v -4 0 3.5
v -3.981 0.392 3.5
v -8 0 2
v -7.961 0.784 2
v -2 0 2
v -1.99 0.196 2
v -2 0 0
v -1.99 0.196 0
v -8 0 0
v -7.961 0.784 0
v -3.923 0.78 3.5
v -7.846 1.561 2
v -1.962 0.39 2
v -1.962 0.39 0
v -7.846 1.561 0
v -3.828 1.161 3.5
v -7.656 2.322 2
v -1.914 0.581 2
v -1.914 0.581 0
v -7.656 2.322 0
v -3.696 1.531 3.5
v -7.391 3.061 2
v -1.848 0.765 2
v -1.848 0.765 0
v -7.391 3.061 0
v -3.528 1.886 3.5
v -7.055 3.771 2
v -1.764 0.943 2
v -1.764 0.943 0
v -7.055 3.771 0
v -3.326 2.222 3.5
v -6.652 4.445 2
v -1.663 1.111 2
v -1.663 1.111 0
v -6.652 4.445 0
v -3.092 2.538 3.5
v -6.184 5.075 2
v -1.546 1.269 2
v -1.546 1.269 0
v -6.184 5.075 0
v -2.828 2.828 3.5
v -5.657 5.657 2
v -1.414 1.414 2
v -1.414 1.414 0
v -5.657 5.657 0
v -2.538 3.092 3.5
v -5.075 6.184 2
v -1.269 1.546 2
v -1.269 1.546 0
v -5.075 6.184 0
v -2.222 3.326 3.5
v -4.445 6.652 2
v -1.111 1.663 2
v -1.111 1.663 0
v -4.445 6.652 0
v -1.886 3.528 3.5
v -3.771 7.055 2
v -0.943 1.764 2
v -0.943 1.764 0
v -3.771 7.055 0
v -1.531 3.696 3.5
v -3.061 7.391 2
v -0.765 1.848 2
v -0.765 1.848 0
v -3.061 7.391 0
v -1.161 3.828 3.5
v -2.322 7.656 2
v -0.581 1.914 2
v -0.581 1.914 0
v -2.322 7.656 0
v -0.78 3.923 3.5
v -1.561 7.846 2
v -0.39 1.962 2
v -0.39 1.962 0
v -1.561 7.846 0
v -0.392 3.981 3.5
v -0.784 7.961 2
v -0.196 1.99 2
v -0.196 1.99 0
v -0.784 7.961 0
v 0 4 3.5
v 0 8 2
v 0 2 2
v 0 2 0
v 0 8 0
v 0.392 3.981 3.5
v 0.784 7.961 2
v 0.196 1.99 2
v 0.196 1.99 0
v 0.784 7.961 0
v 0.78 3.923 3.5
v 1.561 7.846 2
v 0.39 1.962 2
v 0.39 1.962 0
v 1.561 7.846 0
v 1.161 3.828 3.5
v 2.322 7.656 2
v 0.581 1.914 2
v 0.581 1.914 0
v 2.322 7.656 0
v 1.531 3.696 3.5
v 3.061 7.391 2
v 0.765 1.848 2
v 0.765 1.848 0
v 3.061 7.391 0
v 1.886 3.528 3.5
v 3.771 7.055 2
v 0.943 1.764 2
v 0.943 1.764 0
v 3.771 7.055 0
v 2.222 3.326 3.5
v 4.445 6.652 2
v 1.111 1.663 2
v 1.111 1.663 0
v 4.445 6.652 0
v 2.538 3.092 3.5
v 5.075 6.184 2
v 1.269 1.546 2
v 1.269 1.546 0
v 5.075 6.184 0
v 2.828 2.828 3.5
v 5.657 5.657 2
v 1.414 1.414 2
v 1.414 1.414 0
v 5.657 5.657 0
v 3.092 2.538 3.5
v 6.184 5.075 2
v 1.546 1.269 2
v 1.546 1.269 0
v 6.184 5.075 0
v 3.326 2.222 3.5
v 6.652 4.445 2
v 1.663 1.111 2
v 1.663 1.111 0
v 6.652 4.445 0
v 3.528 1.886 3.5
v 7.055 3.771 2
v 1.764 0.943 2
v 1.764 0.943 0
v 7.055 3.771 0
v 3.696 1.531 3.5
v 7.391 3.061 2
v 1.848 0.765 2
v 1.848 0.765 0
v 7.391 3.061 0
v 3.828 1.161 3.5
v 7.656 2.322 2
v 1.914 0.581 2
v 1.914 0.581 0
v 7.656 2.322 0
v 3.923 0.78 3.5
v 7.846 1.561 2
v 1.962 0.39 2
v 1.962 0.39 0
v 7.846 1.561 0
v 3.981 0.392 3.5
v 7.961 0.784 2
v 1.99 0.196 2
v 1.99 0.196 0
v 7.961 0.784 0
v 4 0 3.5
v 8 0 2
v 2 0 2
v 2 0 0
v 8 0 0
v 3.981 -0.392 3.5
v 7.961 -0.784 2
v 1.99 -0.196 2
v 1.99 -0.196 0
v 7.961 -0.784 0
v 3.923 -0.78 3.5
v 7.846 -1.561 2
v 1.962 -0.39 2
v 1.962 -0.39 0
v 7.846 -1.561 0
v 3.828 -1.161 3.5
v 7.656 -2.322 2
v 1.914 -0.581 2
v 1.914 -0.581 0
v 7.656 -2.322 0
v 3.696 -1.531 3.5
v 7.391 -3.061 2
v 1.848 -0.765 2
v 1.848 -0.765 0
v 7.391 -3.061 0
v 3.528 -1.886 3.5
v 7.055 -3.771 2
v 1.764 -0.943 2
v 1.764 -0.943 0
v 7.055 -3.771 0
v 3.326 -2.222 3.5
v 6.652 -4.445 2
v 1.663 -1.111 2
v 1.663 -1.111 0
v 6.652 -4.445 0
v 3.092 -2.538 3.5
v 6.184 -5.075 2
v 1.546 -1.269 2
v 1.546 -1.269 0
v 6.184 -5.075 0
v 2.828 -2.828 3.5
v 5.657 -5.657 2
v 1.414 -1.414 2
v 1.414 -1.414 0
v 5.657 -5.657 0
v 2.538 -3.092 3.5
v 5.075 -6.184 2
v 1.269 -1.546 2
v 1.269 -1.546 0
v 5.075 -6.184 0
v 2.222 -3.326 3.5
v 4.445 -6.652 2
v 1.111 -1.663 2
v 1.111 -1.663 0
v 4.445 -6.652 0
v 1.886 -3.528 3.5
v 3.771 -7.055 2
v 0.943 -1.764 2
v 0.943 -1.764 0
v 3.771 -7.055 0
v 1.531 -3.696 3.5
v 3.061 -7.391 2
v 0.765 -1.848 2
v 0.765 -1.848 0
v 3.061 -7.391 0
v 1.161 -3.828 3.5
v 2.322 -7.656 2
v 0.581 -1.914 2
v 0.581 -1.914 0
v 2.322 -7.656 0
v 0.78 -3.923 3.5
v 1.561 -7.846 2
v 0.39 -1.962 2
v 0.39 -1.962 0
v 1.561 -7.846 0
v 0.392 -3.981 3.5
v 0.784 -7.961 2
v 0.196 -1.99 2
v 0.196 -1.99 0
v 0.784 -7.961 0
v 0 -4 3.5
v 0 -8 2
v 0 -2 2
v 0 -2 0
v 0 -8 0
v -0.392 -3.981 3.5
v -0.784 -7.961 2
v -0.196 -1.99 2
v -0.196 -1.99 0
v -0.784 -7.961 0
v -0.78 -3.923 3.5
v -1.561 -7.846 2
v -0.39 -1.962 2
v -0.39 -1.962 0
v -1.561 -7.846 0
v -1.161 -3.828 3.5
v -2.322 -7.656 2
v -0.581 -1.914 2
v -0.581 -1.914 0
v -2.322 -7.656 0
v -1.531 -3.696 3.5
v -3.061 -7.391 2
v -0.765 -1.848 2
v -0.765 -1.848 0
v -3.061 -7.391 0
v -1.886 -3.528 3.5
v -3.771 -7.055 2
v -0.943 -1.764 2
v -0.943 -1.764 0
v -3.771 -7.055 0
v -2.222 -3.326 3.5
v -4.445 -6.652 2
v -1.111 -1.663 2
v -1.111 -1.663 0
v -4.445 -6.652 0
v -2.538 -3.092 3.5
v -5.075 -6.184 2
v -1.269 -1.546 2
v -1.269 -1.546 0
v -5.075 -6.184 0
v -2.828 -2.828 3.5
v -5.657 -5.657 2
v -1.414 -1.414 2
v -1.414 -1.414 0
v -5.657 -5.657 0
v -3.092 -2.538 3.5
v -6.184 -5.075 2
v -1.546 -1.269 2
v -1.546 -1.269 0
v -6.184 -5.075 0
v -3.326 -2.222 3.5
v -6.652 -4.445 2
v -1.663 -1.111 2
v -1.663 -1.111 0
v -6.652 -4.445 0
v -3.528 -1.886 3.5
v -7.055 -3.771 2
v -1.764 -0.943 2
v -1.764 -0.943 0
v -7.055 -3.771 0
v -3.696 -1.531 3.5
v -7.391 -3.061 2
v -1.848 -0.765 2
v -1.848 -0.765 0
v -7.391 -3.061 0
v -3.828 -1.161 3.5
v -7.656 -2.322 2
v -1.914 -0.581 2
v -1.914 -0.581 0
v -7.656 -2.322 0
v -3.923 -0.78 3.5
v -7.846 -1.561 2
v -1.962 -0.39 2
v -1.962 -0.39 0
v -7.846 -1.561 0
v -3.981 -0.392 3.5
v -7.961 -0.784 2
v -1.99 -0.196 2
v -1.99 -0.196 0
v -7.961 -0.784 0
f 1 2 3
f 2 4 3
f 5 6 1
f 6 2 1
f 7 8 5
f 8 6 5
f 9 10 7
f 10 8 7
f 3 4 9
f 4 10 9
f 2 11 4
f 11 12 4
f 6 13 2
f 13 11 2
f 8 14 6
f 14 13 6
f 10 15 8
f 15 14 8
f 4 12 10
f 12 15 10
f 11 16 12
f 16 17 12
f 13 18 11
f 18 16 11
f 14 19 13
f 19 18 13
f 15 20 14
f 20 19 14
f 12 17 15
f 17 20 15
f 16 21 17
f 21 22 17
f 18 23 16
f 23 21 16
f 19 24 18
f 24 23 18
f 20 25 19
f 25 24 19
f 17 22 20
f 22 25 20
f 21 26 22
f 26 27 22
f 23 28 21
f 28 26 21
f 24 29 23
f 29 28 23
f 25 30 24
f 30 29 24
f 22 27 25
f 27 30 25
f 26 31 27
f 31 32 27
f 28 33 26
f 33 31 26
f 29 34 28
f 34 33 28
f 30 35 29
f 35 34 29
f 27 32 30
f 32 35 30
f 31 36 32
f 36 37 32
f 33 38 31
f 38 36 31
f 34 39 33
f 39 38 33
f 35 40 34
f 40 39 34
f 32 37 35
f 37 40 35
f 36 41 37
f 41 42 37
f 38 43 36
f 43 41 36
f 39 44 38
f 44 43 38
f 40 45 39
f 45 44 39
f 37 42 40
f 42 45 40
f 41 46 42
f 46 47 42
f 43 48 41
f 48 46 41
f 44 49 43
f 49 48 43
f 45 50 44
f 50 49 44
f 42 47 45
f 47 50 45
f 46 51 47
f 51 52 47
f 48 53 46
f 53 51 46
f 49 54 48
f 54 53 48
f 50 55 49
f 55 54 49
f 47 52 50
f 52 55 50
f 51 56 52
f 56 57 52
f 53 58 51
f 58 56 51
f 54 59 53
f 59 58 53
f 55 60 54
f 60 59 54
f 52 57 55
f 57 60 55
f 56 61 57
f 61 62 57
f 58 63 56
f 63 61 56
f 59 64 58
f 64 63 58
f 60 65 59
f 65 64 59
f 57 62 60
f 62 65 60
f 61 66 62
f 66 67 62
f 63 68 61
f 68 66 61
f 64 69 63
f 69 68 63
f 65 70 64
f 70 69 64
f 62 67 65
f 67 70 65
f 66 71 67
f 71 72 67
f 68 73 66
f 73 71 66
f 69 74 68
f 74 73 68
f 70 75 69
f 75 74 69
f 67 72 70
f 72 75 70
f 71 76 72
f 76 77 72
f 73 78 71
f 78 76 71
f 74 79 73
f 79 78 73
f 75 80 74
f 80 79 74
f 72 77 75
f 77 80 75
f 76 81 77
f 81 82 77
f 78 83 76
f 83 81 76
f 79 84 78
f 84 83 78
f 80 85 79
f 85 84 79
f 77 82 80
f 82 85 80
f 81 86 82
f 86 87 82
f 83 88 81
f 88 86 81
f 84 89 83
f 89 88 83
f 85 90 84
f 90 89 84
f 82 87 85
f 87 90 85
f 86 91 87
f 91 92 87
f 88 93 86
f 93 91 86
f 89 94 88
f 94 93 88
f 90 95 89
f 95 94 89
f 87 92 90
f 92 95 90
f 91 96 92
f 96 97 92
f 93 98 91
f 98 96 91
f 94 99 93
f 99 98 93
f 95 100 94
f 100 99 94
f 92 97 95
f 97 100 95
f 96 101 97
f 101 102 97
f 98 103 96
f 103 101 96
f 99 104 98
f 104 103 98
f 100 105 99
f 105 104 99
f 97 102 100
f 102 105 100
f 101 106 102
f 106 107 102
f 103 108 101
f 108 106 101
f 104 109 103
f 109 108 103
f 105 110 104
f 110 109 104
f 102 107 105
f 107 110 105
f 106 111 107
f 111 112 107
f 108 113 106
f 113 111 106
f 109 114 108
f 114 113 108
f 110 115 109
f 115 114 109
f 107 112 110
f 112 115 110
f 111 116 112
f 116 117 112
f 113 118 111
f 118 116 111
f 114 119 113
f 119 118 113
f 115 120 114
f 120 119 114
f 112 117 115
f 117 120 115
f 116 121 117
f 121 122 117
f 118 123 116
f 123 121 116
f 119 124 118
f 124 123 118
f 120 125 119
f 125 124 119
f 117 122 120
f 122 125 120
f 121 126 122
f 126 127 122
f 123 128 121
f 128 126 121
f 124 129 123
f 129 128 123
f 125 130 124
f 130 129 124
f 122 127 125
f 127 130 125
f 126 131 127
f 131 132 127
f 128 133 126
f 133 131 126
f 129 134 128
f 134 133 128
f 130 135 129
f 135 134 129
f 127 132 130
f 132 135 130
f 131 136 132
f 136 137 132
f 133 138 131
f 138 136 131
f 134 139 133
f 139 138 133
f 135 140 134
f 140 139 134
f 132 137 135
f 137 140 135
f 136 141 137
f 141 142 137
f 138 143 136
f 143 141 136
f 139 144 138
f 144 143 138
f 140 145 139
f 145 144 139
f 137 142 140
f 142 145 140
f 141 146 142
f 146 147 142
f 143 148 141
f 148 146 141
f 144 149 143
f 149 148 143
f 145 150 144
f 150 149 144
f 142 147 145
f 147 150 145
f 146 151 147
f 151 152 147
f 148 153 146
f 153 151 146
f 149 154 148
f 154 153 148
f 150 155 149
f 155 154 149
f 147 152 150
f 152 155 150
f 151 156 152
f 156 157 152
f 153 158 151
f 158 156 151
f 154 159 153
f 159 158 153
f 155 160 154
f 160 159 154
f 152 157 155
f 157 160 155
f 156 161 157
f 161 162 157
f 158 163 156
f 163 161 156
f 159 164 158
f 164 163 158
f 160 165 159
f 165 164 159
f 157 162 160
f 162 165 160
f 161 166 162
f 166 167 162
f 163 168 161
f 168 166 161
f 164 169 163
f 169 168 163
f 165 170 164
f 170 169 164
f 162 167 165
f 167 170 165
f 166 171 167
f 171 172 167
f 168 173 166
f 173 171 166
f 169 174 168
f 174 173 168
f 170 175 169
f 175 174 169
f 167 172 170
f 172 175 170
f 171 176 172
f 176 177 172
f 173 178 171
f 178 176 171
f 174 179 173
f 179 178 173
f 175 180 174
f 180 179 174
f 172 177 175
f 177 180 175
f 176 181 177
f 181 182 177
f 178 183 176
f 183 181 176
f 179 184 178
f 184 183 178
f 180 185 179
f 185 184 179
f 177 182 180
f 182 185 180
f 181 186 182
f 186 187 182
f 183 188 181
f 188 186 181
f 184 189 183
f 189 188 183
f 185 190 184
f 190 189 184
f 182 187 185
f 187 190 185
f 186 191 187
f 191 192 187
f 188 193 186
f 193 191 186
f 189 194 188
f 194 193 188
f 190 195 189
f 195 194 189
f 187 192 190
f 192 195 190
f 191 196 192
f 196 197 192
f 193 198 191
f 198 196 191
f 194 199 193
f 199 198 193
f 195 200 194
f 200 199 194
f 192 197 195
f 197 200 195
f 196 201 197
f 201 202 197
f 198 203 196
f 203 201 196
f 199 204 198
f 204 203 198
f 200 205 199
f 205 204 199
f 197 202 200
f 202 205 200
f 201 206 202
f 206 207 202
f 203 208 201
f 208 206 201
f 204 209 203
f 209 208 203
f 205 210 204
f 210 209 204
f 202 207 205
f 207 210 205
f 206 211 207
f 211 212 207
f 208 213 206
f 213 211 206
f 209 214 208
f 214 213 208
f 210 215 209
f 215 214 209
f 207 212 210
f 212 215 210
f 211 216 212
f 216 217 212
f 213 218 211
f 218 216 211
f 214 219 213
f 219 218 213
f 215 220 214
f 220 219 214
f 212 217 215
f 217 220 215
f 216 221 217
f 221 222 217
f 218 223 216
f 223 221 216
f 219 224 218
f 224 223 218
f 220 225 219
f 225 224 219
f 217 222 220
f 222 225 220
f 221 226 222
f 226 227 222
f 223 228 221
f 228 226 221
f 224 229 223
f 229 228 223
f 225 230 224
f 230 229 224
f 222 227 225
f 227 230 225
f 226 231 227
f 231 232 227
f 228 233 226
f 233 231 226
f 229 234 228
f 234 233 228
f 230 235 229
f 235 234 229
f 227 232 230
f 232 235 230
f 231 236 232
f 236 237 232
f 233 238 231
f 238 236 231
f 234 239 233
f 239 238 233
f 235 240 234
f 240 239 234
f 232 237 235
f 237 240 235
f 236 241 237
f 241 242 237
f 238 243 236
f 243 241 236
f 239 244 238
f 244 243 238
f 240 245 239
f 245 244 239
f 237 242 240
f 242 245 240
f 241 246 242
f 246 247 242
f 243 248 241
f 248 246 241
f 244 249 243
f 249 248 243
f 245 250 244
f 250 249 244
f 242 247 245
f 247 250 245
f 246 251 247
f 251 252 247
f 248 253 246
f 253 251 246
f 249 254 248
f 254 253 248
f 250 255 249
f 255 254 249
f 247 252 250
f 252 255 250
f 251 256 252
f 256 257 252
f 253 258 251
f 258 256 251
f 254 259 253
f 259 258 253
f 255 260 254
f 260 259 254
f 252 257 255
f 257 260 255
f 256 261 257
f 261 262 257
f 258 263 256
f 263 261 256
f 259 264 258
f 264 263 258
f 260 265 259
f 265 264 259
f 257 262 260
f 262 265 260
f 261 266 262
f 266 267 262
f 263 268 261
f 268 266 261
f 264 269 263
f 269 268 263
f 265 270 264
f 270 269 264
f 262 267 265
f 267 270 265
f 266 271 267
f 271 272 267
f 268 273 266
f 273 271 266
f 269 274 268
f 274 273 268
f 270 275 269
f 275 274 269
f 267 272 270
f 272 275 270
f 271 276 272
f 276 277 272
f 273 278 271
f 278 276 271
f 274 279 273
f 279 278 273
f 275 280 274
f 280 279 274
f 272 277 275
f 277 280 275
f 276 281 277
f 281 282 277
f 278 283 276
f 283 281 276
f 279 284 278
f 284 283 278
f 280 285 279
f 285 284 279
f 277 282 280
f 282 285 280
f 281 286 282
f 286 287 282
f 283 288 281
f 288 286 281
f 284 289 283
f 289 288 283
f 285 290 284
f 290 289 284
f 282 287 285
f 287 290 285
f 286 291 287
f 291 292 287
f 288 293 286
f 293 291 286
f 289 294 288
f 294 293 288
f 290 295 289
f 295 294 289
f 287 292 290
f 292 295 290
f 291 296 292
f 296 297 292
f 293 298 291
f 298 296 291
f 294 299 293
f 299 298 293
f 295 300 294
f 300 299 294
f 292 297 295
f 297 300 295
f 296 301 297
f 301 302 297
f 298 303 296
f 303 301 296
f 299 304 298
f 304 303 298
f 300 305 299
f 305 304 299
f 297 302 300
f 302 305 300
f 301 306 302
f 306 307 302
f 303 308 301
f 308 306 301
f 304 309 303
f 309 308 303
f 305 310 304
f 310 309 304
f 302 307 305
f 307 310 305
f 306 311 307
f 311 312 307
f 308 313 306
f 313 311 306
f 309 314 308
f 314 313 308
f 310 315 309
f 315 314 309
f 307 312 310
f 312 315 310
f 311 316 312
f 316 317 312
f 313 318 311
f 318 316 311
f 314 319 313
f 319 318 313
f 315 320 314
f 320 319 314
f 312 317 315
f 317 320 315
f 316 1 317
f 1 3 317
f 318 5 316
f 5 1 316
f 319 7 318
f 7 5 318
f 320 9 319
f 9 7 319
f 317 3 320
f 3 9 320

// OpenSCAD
hole = 4;
outerThickness = 1;
innerThickness = 3.5;
head = 8;
minThickness = 2;
diameter = 16;

nudge = 0.001;
$fn = 64;

rotate_extrude() {
    polygon([[diameter/2,0],
            [diameter/2,minThickness],
            [head/2,innerThickness],
            [hole/2,minThickness],
            [hole/2,0]]);
}
